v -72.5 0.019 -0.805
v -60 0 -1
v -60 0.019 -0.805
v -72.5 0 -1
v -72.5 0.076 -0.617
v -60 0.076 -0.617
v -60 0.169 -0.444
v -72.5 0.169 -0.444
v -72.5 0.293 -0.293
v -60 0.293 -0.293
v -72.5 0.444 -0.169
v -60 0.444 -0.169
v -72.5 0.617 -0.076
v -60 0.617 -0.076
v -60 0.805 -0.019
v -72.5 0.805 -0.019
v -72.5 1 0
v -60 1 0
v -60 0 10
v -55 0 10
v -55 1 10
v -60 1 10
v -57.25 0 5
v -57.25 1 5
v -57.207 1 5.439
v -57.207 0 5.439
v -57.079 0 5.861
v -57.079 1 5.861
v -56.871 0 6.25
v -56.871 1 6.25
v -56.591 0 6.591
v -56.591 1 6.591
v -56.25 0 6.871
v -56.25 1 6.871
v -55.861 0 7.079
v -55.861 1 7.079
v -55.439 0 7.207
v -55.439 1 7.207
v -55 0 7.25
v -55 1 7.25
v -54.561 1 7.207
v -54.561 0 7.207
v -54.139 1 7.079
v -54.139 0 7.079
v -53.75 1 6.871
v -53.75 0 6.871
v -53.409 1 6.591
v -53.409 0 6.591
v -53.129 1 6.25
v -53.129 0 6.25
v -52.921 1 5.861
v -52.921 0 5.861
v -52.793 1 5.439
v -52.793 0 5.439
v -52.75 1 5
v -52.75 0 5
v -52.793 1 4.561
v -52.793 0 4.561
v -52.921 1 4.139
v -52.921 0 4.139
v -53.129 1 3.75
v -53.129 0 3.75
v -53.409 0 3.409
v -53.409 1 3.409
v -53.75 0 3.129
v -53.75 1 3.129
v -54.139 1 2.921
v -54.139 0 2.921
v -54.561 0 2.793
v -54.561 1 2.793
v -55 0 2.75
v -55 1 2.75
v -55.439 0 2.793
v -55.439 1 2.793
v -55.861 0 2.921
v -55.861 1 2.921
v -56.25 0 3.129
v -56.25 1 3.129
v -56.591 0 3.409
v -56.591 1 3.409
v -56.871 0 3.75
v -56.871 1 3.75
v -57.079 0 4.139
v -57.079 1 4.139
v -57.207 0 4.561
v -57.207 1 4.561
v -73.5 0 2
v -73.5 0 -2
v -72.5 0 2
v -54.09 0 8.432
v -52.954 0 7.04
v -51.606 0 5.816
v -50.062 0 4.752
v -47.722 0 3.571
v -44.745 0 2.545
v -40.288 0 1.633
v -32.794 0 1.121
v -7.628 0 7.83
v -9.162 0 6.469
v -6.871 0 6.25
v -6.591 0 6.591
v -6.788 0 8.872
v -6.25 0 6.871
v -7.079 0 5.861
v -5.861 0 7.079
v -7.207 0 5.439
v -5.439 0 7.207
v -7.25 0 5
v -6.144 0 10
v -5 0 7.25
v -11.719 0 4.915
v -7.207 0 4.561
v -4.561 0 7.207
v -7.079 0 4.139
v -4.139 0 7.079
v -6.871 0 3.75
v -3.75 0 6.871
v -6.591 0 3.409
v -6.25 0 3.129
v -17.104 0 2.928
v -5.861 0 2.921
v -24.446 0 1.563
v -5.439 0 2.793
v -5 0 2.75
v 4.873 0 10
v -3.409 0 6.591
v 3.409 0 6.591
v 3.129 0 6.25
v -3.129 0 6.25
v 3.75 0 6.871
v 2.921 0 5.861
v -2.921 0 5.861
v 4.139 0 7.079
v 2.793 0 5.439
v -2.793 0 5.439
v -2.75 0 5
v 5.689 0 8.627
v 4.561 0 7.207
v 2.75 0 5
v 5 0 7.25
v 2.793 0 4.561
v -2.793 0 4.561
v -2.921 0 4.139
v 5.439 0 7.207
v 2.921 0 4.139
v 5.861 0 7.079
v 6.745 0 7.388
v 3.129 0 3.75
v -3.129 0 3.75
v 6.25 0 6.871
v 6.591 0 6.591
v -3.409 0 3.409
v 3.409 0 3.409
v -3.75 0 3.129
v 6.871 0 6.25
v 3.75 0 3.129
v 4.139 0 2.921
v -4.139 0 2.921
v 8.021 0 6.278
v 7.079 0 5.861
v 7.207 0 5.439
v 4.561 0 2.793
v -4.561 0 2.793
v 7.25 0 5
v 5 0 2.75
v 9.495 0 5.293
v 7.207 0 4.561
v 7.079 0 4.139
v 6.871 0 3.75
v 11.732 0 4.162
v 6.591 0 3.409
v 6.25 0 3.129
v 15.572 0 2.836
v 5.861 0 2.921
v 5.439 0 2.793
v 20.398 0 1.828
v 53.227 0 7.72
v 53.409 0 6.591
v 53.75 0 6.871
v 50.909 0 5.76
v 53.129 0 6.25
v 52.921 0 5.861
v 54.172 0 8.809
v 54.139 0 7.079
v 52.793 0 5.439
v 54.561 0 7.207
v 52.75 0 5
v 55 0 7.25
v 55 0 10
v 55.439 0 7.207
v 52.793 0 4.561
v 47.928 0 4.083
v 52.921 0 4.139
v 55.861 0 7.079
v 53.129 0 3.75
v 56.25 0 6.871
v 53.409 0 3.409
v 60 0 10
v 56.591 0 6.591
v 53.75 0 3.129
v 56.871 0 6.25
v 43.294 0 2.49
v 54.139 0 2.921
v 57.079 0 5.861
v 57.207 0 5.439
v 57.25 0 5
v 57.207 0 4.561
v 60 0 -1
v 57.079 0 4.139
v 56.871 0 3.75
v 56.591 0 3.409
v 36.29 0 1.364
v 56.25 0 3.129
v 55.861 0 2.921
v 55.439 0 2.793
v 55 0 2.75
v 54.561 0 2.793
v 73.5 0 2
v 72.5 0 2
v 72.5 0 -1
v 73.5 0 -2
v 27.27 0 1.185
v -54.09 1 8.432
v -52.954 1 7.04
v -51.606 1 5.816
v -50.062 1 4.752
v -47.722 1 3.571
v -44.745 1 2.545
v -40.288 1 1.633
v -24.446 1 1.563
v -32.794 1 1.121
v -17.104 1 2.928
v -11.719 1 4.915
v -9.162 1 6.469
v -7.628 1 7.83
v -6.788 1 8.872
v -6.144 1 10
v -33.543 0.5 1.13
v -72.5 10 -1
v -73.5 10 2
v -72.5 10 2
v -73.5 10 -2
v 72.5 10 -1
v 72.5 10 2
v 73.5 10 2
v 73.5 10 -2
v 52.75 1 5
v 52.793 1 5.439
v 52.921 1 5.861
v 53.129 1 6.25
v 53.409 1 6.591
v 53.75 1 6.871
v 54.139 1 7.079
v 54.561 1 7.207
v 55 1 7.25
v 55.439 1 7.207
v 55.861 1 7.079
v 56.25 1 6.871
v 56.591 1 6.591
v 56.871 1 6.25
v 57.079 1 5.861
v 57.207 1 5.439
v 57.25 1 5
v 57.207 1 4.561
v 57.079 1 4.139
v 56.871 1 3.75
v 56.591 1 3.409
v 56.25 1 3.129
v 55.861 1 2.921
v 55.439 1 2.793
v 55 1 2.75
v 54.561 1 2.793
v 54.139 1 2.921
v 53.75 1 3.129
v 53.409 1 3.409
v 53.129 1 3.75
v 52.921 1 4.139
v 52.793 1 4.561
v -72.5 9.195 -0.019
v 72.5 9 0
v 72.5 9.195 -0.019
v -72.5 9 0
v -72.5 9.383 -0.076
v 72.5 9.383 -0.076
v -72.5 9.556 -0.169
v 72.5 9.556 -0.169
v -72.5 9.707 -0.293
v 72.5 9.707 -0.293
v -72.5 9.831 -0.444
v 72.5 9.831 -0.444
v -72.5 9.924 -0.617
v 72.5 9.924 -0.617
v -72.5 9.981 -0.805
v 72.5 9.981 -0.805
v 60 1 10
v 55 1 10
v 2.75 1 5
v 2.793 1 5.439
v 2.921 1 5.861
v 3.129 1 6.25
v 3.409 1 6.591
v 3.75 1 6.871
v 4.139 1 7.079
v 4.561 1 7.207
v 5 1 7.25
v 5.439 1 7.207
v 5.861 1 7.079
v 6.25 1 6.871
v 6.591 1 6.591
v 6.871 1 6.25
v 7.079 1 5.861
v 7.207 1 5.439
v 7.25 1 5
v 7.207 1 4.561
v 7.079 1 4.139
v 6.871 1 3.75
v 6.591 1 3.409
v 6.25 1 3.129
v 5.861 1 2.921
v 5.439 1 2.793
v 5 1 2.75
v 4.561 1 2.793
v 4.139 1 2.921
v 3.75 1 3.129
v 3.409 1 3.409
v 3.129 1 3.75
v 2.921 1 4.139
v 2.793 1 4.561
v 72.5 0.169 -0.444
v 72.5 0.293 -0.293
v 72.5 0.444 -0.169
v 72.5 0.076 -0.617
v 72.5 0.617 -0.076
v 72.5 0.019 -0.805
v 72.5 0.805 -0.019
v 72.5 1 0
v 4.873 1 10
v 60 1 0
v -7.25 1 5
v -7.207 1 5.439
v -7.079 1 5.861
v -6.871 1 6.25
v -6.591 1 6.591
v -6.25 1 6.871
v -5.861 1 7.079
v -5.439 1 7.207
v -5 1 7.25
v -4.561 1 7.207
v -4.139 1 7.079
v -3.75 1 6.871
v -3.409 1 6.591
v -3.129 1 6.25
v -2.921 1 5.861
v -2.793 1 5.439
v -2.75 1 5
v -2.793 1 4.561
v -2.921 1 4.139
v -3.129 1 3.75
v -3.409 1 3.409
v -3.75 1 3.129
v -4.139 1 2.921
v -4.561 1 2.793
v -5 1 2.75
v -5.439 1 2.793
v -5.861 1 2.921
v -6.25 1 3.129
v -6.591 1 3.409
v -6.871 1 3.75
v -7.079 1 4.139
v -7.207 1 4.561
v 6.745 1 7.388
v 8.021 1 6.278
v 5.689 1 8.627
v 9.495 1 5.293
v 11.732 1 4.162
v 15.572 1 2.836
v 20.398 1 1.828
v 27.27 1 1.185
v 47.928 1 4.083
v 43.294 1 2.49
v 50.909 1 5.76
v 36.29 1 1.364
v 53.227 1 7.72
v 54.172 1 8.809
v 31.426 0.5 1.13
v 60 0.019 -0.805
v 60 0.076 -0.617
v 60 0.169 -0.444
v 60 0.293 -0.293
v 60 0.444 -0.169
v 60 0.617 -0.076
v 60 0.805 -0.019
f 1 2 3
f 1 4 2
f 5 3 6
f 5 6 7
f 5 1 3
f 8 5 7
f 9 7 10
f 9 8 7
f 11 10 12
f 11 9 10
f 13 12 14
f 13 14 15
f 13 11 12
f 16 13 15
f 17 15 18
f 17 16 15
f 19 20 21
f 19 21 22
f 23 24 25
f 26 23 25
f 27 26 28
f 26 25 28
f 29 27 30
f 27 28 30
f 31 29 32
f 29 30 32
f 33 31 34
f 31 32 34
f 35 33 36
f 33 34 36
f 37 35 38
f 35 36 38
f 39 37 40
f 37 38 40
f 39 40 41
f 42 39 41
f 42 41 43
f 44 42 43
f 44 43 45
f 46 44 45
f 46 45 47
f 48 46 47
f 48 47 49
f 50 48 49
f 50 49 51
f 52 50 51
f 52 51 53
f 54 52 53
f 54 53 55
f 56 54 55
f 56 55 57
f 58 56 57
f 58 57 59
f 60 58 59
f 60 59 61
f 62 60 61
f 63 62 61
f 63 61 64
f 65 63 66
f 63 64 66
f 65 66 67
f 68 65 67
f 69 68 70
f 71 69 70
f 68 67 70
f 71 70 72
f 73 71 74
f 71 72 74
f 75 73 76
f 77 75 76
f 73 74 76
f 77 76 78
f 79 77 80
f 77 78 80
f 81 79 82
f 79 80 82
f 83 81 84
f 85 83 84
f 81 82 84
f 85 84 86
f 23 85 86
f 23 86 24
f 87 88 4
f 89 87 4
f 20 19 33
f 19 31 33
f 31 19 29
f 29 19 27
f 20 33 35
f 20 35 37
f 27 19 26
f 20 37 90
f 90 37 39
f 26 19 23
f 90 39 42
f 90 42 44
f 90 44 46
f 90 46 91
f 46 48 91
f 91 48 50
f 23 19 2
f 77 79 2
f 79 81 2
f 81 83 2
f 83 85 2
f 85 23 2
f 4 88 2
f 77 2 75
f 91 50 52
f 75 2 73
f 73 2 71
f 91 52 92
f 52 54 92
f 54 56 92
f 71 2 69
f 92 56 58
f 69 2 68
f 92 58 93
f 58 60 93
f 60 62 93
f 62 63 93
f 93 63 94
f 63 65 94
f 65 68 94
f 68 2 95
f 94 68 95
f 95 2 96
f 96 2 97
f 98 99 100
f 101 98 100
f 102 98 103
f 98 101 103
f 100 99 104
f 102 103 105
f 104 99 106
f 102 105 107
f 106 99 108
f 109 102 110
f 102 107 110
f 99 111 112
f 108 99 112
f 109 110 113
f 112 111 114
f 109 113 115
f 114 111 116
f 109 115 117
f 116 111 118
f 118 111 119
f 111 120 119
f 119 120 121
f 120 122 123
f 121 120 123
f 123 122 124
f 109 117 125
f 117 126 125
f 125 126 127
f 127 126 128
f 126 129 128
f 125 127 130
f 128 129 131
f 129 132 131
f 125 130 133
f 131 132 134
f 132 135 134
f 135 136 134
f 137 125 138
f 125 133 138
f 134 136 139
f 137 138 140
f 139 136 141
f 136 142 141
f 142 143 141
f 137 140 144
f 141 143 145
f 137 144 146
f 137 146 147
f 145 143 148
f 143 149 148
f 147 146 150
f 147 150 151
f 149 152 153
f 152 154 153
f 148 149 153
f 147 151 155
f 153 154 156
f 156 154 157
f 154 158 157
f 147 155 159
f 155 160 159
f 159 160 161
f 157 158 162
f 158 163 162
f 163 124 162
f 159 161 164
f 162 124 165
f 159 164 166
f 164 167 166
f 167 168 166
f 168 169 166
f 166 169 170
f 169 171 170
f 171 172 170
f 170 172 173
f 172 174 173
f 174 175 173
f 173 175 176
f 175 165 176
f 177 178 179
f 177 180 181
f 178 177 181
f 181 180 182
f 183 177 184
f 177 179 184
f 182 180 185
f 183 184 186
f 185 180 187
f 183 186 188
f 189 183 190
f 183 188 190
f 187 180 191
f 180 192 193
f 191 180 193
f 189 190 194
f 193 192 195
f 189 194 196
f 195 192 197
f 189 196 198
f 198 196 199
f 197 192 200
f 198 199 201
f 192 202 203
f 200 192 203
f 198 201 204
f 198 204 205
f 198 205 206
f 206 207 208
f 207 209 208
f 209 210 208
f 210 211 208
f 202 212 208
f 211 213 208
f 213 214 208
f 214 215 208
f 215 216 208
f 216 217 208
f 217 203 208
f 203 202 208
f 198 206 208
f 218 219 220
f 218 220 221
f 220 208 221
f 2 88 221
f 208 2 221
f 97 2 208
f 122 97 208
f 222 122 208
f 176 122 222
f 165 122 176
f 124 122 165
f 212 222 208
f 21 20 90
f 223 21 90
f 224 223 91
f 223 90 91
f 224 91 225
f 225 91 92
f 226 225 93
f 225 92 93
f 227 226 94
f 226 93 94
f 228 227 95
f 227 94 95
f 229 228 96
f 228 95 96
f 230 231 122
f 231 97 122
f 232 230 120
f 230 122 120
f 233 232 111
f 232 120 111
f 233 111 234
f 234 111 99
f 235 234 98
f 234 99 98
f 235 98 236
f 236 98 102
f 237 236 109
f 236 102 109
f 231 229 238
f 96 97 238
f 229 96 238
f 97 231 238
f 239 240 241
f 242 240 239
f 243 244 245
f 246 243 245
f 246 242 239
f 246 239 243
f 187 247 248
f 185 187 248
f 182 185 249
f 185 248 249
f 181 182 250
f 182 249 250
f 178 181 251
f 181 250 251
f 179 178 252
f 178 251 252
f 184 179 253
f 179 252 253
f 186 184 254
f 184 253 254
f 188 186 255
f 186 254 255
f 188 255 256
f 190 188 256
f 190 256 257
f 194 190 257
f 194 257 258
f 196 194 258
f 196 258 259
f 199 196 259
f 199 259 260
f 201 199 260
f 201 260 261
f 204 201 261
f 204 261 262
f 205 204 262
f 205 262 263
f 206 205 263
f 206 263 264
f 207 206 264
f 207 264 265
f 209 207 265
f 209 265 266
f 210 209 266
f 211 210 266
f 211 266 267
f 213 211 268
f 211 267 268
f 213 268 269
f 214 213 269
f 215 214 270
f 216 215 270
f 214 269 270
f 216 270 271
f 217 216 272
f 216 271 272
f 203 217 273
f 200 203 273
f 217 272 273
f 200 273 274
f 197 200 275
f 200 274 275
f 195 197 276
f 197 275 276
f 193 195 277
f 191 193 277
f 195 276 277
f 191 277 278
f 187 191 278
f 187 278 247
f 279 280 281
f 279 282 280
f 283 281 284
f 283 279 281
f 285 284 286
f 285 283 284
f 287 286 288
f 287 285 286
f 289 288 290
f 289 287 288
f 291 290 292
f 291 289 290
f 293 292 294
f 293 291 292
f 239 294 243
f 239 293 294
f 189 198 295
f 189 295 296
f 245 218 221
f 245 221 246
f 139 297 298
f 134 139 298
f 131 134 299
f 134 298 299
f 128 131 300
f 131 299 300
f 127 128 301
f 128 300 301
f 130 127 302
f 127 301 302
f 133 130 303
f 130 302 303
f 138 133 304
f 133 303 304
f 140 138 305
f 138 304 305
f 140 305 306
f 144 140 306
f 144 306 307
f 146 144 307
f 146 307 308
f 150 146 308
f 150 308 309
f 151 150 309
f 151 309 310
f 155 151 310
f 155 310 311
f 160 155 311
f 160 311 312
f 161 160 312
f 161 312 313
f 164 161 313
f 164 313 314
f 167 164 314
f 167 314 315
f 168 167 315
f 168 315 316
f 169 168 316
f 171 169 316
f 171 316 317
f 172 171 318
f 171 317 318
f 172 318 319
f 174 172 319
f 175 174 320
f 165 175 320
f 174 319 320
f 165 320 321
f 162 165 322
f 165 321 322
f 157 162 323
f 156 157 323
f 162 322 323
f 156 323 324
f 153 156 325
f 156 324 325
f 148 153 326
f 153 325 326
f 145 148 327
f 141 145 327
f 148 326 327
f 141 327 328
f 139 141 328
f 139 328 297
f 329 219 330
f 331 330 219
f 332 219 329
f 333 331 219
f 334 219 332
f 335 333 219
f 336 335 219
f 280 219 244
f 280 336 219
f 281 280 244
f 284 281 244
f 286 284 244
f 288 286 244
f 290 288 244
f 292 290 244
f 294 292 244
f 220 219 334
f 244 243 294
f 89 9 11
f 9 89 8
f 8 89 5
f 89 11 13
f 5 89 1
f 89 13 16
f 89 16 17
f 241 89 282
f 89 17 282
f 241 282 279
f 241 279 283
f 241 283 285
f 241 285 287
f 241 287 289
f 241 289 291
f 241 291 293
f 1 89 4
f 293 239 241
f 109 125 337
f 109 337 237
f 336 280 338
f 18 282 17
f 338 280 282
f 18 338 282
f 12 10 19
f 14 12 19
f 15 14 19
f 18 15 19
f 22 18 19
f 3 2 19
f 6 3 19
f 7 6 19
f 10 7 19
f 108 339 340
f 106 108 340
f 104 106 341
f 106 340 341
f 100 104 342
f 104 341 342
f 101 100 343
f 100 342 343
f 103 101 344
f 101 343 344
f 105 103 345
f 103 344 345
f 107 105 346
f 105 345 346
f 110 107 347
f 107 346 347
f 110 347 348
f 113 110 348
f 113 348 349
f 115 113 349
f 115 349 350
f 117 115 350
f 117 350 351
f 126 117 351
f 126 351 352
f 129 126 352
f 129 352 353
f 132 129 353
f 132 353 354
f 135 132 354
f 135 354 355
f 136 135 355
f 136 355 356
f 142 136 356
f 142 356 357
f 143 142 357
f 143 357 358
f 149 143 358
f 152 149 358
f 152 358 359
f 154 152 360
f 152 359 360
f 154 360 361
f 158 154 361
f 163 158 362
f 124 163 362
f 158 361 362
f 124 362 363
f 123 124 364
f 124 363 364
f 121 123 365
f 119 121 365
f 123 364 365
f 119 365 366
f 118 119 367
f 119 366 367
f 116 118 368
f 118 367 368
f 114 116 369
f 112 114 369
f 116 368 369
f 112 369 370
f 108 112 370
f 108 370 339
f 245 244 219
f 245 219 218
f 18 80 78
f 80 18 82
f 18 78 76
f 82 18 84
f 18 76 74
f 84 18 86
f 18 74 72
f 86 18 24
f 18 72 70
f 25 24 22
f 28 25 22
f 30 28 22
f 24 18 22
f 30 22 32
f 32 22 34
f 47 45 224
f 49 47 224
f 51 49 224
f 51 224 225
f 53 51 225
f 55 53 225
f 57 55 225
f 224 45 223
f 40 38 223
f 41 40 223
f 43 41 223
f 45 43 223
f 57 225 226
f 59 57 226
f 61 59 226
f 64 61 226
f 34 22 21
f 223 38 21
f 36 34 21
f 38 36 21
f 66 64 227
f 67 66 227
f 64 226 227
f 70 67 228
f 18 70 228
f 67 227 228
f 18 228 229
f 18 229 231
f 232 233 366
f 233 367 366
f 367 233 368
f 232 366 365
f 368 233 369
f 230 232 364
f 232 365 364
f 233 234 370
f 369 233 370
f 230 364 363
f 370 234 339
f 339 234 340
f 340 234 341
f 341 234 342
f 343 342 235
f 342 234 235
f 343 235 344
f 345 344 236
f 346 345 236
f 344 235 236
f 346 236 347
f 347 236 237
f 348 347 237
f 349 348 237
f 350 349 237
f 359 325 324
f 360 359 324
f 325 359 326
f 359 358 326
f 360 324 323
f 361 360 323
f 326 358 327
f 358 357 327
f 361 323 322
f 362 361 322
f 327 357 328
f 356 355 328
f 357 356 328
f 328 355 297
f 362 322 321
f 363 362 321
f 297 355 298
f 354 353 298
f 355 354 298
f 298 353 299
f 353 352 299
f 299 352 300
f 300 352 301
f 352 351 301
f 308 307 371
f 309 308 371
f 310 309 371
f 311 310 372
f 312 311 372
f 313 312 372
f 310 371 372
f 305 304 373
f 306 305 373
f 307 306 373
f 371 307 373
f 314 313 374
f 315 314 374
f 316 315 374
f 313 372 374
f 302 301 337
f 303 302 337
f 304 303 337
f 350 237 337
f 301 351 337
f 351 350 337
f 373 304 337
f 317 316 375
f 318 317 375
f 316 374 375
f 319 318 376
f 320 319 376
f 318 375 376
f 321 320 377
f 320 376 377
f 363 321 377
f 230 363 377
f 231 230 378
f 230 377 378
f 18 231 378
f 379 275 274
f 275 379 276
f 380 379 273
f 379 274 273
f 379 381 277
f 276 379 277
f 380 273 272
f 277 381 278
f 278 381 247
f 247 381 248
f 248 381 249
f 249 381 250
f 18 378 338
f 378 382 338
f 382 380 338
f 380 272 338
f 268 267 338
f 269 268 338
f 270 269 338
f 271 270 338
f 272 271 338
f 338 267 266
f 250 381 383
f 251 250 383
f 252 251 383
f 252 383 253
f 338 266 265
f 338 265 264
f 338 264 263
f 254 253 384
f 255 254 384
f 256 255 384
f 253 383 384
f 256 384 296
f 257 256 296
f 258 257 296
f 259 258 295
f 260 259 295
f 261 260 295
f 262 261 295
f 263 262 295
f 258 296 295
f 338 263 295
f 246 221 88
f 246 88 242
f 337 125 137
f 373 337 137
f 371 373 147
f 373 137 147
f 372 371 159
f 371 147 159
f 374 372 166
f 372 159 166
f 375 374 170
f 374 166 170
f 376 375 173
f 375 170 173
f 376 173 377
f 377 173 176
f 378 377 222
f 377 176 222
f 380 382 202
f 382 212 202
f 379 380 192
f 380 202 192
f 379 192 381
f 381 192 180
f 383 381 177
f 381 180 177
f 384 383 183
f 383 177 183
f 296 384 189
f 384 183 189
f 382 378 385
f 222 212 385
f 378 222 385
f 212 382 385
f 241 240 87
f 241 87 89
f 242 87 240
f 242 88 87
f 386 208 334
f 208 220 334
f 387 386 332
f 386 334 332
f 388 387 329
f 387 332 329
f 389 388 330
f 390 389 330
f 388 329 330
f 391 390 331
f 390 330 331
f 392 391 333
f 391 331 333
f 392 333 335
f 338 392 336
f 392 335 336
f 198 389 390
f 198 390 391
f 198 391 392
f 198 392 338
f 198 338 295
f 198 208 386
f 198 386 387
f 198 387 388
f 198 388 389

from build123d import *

# Parameters (mm, degrees)
F1_DEPTH = 1
F0_W     = 120
F0_H     = 2
F2_DEPTH = 10
F3_D     = 4.5
F3_DEPTH = 2
F3_TIP   = 1.3519363928
F5_DEPTH = 13.5
F7_DEPTH = 13.5
F8_W     = 1
F8_H     = 10
F9_DEPTH = 2
F10_R    = 1


with BuildPart() as f1:
    # F0 (on Front) → F1 (new body)
    with BuildSketch(Plane.XZ):
        with BuildLine():
            Line((-60, 10), (-60, 0))
            Line((-60, 0), (60, 0))
            Line((60, 0), (60, 10))
            Line((60, 10), (55, 10))
            add(Edge.make_bspline(
                [(4.8726298846, 10), (8.1773018464, 3.085560631), (32.161216462, -1.0187632381), (50.9468838573, 3.4464653581), (55, 10)],
                knots=[0, 0, 0, 0, 0.5132056899, 1, 1, 1, 1], degree=3))
            Line((4.8726298846, 10), (-6.1437510885, 10))
            add(Edge.make_bspline(
                [(-55, 10), (-51.9492179155, 3.6175639834), (-34.2229071391, -1.2678204247), (-9.1991592199, 3.3849673346), (-6.1437510885, 10)],
                knots=[0, 0, 0, 0, 0.4730947214, 1, 1, 1, 1], degree=3))
            Line((-55, 10), (-60, 10))
        make_face()
    extrude(amount=-F1_DEPTH)

    # F0 (on Front) → F2 (join)
    with BuildSketch(Plane.XZ):
        with Locations((0, -1)):
            Rectangle(F0_W, F0_H)
    extrude(amount=-F2_DEPTH)

    # F3
    with Locations(Plane.XZ):
        with Locations((-55, 5), (-5, 5), (5, 5), (55, 5)):
            Hole(F3_D / 2, depth=F3_DEPTH)
            with Locations((0, 0, -(F3_DEPTH + F3_TIP / 2))):  # 118° drill point
                Cone(0, F3_D / 2, F3_TIP, mode=Mode.SUBTRACT)

    # F4 (on face) → F5 (join)
    with BuildSketch(Plane(origin=(-60, 0, 0), x_dir=(0, -1, 0), z_dir=(-1, 0, 0))):
        Polygon((-1, 0), (-10, 0), (-10, -2), (0, -2), (0, 0), align=None)
    extrude(amount=F5_DEPTH)

    # F6 (on face) → F7 (join)
    with BuildSketch(Plane.YZ.offset(60)):
        Polygon((0, 0), (0, -2), (10, -2), (10, 0), (1, 0), align=None)
    extrude(amount=F7_DEPTH)

    # F8 (on face) → F9 (join)
    with BuildSketch(Plane.XY):
        with Locations((-73, 5)):
            Rectangle(F8_W, F8_H)
        with Locations((73, 5)):
            Rectangle(F8_W, F8_H)
    extrude(amount=F9_DEPTH)

    # F10
    f10_edges = [f1.edges().sort_by_distance(p)[0] for p in [
        (0, 10, 0),
        (-66.25, 0, 0),
        (66.25, 0, 0),
    ]]
    fillet(f10_edges, radius=F10_R)


solid = f1.part
